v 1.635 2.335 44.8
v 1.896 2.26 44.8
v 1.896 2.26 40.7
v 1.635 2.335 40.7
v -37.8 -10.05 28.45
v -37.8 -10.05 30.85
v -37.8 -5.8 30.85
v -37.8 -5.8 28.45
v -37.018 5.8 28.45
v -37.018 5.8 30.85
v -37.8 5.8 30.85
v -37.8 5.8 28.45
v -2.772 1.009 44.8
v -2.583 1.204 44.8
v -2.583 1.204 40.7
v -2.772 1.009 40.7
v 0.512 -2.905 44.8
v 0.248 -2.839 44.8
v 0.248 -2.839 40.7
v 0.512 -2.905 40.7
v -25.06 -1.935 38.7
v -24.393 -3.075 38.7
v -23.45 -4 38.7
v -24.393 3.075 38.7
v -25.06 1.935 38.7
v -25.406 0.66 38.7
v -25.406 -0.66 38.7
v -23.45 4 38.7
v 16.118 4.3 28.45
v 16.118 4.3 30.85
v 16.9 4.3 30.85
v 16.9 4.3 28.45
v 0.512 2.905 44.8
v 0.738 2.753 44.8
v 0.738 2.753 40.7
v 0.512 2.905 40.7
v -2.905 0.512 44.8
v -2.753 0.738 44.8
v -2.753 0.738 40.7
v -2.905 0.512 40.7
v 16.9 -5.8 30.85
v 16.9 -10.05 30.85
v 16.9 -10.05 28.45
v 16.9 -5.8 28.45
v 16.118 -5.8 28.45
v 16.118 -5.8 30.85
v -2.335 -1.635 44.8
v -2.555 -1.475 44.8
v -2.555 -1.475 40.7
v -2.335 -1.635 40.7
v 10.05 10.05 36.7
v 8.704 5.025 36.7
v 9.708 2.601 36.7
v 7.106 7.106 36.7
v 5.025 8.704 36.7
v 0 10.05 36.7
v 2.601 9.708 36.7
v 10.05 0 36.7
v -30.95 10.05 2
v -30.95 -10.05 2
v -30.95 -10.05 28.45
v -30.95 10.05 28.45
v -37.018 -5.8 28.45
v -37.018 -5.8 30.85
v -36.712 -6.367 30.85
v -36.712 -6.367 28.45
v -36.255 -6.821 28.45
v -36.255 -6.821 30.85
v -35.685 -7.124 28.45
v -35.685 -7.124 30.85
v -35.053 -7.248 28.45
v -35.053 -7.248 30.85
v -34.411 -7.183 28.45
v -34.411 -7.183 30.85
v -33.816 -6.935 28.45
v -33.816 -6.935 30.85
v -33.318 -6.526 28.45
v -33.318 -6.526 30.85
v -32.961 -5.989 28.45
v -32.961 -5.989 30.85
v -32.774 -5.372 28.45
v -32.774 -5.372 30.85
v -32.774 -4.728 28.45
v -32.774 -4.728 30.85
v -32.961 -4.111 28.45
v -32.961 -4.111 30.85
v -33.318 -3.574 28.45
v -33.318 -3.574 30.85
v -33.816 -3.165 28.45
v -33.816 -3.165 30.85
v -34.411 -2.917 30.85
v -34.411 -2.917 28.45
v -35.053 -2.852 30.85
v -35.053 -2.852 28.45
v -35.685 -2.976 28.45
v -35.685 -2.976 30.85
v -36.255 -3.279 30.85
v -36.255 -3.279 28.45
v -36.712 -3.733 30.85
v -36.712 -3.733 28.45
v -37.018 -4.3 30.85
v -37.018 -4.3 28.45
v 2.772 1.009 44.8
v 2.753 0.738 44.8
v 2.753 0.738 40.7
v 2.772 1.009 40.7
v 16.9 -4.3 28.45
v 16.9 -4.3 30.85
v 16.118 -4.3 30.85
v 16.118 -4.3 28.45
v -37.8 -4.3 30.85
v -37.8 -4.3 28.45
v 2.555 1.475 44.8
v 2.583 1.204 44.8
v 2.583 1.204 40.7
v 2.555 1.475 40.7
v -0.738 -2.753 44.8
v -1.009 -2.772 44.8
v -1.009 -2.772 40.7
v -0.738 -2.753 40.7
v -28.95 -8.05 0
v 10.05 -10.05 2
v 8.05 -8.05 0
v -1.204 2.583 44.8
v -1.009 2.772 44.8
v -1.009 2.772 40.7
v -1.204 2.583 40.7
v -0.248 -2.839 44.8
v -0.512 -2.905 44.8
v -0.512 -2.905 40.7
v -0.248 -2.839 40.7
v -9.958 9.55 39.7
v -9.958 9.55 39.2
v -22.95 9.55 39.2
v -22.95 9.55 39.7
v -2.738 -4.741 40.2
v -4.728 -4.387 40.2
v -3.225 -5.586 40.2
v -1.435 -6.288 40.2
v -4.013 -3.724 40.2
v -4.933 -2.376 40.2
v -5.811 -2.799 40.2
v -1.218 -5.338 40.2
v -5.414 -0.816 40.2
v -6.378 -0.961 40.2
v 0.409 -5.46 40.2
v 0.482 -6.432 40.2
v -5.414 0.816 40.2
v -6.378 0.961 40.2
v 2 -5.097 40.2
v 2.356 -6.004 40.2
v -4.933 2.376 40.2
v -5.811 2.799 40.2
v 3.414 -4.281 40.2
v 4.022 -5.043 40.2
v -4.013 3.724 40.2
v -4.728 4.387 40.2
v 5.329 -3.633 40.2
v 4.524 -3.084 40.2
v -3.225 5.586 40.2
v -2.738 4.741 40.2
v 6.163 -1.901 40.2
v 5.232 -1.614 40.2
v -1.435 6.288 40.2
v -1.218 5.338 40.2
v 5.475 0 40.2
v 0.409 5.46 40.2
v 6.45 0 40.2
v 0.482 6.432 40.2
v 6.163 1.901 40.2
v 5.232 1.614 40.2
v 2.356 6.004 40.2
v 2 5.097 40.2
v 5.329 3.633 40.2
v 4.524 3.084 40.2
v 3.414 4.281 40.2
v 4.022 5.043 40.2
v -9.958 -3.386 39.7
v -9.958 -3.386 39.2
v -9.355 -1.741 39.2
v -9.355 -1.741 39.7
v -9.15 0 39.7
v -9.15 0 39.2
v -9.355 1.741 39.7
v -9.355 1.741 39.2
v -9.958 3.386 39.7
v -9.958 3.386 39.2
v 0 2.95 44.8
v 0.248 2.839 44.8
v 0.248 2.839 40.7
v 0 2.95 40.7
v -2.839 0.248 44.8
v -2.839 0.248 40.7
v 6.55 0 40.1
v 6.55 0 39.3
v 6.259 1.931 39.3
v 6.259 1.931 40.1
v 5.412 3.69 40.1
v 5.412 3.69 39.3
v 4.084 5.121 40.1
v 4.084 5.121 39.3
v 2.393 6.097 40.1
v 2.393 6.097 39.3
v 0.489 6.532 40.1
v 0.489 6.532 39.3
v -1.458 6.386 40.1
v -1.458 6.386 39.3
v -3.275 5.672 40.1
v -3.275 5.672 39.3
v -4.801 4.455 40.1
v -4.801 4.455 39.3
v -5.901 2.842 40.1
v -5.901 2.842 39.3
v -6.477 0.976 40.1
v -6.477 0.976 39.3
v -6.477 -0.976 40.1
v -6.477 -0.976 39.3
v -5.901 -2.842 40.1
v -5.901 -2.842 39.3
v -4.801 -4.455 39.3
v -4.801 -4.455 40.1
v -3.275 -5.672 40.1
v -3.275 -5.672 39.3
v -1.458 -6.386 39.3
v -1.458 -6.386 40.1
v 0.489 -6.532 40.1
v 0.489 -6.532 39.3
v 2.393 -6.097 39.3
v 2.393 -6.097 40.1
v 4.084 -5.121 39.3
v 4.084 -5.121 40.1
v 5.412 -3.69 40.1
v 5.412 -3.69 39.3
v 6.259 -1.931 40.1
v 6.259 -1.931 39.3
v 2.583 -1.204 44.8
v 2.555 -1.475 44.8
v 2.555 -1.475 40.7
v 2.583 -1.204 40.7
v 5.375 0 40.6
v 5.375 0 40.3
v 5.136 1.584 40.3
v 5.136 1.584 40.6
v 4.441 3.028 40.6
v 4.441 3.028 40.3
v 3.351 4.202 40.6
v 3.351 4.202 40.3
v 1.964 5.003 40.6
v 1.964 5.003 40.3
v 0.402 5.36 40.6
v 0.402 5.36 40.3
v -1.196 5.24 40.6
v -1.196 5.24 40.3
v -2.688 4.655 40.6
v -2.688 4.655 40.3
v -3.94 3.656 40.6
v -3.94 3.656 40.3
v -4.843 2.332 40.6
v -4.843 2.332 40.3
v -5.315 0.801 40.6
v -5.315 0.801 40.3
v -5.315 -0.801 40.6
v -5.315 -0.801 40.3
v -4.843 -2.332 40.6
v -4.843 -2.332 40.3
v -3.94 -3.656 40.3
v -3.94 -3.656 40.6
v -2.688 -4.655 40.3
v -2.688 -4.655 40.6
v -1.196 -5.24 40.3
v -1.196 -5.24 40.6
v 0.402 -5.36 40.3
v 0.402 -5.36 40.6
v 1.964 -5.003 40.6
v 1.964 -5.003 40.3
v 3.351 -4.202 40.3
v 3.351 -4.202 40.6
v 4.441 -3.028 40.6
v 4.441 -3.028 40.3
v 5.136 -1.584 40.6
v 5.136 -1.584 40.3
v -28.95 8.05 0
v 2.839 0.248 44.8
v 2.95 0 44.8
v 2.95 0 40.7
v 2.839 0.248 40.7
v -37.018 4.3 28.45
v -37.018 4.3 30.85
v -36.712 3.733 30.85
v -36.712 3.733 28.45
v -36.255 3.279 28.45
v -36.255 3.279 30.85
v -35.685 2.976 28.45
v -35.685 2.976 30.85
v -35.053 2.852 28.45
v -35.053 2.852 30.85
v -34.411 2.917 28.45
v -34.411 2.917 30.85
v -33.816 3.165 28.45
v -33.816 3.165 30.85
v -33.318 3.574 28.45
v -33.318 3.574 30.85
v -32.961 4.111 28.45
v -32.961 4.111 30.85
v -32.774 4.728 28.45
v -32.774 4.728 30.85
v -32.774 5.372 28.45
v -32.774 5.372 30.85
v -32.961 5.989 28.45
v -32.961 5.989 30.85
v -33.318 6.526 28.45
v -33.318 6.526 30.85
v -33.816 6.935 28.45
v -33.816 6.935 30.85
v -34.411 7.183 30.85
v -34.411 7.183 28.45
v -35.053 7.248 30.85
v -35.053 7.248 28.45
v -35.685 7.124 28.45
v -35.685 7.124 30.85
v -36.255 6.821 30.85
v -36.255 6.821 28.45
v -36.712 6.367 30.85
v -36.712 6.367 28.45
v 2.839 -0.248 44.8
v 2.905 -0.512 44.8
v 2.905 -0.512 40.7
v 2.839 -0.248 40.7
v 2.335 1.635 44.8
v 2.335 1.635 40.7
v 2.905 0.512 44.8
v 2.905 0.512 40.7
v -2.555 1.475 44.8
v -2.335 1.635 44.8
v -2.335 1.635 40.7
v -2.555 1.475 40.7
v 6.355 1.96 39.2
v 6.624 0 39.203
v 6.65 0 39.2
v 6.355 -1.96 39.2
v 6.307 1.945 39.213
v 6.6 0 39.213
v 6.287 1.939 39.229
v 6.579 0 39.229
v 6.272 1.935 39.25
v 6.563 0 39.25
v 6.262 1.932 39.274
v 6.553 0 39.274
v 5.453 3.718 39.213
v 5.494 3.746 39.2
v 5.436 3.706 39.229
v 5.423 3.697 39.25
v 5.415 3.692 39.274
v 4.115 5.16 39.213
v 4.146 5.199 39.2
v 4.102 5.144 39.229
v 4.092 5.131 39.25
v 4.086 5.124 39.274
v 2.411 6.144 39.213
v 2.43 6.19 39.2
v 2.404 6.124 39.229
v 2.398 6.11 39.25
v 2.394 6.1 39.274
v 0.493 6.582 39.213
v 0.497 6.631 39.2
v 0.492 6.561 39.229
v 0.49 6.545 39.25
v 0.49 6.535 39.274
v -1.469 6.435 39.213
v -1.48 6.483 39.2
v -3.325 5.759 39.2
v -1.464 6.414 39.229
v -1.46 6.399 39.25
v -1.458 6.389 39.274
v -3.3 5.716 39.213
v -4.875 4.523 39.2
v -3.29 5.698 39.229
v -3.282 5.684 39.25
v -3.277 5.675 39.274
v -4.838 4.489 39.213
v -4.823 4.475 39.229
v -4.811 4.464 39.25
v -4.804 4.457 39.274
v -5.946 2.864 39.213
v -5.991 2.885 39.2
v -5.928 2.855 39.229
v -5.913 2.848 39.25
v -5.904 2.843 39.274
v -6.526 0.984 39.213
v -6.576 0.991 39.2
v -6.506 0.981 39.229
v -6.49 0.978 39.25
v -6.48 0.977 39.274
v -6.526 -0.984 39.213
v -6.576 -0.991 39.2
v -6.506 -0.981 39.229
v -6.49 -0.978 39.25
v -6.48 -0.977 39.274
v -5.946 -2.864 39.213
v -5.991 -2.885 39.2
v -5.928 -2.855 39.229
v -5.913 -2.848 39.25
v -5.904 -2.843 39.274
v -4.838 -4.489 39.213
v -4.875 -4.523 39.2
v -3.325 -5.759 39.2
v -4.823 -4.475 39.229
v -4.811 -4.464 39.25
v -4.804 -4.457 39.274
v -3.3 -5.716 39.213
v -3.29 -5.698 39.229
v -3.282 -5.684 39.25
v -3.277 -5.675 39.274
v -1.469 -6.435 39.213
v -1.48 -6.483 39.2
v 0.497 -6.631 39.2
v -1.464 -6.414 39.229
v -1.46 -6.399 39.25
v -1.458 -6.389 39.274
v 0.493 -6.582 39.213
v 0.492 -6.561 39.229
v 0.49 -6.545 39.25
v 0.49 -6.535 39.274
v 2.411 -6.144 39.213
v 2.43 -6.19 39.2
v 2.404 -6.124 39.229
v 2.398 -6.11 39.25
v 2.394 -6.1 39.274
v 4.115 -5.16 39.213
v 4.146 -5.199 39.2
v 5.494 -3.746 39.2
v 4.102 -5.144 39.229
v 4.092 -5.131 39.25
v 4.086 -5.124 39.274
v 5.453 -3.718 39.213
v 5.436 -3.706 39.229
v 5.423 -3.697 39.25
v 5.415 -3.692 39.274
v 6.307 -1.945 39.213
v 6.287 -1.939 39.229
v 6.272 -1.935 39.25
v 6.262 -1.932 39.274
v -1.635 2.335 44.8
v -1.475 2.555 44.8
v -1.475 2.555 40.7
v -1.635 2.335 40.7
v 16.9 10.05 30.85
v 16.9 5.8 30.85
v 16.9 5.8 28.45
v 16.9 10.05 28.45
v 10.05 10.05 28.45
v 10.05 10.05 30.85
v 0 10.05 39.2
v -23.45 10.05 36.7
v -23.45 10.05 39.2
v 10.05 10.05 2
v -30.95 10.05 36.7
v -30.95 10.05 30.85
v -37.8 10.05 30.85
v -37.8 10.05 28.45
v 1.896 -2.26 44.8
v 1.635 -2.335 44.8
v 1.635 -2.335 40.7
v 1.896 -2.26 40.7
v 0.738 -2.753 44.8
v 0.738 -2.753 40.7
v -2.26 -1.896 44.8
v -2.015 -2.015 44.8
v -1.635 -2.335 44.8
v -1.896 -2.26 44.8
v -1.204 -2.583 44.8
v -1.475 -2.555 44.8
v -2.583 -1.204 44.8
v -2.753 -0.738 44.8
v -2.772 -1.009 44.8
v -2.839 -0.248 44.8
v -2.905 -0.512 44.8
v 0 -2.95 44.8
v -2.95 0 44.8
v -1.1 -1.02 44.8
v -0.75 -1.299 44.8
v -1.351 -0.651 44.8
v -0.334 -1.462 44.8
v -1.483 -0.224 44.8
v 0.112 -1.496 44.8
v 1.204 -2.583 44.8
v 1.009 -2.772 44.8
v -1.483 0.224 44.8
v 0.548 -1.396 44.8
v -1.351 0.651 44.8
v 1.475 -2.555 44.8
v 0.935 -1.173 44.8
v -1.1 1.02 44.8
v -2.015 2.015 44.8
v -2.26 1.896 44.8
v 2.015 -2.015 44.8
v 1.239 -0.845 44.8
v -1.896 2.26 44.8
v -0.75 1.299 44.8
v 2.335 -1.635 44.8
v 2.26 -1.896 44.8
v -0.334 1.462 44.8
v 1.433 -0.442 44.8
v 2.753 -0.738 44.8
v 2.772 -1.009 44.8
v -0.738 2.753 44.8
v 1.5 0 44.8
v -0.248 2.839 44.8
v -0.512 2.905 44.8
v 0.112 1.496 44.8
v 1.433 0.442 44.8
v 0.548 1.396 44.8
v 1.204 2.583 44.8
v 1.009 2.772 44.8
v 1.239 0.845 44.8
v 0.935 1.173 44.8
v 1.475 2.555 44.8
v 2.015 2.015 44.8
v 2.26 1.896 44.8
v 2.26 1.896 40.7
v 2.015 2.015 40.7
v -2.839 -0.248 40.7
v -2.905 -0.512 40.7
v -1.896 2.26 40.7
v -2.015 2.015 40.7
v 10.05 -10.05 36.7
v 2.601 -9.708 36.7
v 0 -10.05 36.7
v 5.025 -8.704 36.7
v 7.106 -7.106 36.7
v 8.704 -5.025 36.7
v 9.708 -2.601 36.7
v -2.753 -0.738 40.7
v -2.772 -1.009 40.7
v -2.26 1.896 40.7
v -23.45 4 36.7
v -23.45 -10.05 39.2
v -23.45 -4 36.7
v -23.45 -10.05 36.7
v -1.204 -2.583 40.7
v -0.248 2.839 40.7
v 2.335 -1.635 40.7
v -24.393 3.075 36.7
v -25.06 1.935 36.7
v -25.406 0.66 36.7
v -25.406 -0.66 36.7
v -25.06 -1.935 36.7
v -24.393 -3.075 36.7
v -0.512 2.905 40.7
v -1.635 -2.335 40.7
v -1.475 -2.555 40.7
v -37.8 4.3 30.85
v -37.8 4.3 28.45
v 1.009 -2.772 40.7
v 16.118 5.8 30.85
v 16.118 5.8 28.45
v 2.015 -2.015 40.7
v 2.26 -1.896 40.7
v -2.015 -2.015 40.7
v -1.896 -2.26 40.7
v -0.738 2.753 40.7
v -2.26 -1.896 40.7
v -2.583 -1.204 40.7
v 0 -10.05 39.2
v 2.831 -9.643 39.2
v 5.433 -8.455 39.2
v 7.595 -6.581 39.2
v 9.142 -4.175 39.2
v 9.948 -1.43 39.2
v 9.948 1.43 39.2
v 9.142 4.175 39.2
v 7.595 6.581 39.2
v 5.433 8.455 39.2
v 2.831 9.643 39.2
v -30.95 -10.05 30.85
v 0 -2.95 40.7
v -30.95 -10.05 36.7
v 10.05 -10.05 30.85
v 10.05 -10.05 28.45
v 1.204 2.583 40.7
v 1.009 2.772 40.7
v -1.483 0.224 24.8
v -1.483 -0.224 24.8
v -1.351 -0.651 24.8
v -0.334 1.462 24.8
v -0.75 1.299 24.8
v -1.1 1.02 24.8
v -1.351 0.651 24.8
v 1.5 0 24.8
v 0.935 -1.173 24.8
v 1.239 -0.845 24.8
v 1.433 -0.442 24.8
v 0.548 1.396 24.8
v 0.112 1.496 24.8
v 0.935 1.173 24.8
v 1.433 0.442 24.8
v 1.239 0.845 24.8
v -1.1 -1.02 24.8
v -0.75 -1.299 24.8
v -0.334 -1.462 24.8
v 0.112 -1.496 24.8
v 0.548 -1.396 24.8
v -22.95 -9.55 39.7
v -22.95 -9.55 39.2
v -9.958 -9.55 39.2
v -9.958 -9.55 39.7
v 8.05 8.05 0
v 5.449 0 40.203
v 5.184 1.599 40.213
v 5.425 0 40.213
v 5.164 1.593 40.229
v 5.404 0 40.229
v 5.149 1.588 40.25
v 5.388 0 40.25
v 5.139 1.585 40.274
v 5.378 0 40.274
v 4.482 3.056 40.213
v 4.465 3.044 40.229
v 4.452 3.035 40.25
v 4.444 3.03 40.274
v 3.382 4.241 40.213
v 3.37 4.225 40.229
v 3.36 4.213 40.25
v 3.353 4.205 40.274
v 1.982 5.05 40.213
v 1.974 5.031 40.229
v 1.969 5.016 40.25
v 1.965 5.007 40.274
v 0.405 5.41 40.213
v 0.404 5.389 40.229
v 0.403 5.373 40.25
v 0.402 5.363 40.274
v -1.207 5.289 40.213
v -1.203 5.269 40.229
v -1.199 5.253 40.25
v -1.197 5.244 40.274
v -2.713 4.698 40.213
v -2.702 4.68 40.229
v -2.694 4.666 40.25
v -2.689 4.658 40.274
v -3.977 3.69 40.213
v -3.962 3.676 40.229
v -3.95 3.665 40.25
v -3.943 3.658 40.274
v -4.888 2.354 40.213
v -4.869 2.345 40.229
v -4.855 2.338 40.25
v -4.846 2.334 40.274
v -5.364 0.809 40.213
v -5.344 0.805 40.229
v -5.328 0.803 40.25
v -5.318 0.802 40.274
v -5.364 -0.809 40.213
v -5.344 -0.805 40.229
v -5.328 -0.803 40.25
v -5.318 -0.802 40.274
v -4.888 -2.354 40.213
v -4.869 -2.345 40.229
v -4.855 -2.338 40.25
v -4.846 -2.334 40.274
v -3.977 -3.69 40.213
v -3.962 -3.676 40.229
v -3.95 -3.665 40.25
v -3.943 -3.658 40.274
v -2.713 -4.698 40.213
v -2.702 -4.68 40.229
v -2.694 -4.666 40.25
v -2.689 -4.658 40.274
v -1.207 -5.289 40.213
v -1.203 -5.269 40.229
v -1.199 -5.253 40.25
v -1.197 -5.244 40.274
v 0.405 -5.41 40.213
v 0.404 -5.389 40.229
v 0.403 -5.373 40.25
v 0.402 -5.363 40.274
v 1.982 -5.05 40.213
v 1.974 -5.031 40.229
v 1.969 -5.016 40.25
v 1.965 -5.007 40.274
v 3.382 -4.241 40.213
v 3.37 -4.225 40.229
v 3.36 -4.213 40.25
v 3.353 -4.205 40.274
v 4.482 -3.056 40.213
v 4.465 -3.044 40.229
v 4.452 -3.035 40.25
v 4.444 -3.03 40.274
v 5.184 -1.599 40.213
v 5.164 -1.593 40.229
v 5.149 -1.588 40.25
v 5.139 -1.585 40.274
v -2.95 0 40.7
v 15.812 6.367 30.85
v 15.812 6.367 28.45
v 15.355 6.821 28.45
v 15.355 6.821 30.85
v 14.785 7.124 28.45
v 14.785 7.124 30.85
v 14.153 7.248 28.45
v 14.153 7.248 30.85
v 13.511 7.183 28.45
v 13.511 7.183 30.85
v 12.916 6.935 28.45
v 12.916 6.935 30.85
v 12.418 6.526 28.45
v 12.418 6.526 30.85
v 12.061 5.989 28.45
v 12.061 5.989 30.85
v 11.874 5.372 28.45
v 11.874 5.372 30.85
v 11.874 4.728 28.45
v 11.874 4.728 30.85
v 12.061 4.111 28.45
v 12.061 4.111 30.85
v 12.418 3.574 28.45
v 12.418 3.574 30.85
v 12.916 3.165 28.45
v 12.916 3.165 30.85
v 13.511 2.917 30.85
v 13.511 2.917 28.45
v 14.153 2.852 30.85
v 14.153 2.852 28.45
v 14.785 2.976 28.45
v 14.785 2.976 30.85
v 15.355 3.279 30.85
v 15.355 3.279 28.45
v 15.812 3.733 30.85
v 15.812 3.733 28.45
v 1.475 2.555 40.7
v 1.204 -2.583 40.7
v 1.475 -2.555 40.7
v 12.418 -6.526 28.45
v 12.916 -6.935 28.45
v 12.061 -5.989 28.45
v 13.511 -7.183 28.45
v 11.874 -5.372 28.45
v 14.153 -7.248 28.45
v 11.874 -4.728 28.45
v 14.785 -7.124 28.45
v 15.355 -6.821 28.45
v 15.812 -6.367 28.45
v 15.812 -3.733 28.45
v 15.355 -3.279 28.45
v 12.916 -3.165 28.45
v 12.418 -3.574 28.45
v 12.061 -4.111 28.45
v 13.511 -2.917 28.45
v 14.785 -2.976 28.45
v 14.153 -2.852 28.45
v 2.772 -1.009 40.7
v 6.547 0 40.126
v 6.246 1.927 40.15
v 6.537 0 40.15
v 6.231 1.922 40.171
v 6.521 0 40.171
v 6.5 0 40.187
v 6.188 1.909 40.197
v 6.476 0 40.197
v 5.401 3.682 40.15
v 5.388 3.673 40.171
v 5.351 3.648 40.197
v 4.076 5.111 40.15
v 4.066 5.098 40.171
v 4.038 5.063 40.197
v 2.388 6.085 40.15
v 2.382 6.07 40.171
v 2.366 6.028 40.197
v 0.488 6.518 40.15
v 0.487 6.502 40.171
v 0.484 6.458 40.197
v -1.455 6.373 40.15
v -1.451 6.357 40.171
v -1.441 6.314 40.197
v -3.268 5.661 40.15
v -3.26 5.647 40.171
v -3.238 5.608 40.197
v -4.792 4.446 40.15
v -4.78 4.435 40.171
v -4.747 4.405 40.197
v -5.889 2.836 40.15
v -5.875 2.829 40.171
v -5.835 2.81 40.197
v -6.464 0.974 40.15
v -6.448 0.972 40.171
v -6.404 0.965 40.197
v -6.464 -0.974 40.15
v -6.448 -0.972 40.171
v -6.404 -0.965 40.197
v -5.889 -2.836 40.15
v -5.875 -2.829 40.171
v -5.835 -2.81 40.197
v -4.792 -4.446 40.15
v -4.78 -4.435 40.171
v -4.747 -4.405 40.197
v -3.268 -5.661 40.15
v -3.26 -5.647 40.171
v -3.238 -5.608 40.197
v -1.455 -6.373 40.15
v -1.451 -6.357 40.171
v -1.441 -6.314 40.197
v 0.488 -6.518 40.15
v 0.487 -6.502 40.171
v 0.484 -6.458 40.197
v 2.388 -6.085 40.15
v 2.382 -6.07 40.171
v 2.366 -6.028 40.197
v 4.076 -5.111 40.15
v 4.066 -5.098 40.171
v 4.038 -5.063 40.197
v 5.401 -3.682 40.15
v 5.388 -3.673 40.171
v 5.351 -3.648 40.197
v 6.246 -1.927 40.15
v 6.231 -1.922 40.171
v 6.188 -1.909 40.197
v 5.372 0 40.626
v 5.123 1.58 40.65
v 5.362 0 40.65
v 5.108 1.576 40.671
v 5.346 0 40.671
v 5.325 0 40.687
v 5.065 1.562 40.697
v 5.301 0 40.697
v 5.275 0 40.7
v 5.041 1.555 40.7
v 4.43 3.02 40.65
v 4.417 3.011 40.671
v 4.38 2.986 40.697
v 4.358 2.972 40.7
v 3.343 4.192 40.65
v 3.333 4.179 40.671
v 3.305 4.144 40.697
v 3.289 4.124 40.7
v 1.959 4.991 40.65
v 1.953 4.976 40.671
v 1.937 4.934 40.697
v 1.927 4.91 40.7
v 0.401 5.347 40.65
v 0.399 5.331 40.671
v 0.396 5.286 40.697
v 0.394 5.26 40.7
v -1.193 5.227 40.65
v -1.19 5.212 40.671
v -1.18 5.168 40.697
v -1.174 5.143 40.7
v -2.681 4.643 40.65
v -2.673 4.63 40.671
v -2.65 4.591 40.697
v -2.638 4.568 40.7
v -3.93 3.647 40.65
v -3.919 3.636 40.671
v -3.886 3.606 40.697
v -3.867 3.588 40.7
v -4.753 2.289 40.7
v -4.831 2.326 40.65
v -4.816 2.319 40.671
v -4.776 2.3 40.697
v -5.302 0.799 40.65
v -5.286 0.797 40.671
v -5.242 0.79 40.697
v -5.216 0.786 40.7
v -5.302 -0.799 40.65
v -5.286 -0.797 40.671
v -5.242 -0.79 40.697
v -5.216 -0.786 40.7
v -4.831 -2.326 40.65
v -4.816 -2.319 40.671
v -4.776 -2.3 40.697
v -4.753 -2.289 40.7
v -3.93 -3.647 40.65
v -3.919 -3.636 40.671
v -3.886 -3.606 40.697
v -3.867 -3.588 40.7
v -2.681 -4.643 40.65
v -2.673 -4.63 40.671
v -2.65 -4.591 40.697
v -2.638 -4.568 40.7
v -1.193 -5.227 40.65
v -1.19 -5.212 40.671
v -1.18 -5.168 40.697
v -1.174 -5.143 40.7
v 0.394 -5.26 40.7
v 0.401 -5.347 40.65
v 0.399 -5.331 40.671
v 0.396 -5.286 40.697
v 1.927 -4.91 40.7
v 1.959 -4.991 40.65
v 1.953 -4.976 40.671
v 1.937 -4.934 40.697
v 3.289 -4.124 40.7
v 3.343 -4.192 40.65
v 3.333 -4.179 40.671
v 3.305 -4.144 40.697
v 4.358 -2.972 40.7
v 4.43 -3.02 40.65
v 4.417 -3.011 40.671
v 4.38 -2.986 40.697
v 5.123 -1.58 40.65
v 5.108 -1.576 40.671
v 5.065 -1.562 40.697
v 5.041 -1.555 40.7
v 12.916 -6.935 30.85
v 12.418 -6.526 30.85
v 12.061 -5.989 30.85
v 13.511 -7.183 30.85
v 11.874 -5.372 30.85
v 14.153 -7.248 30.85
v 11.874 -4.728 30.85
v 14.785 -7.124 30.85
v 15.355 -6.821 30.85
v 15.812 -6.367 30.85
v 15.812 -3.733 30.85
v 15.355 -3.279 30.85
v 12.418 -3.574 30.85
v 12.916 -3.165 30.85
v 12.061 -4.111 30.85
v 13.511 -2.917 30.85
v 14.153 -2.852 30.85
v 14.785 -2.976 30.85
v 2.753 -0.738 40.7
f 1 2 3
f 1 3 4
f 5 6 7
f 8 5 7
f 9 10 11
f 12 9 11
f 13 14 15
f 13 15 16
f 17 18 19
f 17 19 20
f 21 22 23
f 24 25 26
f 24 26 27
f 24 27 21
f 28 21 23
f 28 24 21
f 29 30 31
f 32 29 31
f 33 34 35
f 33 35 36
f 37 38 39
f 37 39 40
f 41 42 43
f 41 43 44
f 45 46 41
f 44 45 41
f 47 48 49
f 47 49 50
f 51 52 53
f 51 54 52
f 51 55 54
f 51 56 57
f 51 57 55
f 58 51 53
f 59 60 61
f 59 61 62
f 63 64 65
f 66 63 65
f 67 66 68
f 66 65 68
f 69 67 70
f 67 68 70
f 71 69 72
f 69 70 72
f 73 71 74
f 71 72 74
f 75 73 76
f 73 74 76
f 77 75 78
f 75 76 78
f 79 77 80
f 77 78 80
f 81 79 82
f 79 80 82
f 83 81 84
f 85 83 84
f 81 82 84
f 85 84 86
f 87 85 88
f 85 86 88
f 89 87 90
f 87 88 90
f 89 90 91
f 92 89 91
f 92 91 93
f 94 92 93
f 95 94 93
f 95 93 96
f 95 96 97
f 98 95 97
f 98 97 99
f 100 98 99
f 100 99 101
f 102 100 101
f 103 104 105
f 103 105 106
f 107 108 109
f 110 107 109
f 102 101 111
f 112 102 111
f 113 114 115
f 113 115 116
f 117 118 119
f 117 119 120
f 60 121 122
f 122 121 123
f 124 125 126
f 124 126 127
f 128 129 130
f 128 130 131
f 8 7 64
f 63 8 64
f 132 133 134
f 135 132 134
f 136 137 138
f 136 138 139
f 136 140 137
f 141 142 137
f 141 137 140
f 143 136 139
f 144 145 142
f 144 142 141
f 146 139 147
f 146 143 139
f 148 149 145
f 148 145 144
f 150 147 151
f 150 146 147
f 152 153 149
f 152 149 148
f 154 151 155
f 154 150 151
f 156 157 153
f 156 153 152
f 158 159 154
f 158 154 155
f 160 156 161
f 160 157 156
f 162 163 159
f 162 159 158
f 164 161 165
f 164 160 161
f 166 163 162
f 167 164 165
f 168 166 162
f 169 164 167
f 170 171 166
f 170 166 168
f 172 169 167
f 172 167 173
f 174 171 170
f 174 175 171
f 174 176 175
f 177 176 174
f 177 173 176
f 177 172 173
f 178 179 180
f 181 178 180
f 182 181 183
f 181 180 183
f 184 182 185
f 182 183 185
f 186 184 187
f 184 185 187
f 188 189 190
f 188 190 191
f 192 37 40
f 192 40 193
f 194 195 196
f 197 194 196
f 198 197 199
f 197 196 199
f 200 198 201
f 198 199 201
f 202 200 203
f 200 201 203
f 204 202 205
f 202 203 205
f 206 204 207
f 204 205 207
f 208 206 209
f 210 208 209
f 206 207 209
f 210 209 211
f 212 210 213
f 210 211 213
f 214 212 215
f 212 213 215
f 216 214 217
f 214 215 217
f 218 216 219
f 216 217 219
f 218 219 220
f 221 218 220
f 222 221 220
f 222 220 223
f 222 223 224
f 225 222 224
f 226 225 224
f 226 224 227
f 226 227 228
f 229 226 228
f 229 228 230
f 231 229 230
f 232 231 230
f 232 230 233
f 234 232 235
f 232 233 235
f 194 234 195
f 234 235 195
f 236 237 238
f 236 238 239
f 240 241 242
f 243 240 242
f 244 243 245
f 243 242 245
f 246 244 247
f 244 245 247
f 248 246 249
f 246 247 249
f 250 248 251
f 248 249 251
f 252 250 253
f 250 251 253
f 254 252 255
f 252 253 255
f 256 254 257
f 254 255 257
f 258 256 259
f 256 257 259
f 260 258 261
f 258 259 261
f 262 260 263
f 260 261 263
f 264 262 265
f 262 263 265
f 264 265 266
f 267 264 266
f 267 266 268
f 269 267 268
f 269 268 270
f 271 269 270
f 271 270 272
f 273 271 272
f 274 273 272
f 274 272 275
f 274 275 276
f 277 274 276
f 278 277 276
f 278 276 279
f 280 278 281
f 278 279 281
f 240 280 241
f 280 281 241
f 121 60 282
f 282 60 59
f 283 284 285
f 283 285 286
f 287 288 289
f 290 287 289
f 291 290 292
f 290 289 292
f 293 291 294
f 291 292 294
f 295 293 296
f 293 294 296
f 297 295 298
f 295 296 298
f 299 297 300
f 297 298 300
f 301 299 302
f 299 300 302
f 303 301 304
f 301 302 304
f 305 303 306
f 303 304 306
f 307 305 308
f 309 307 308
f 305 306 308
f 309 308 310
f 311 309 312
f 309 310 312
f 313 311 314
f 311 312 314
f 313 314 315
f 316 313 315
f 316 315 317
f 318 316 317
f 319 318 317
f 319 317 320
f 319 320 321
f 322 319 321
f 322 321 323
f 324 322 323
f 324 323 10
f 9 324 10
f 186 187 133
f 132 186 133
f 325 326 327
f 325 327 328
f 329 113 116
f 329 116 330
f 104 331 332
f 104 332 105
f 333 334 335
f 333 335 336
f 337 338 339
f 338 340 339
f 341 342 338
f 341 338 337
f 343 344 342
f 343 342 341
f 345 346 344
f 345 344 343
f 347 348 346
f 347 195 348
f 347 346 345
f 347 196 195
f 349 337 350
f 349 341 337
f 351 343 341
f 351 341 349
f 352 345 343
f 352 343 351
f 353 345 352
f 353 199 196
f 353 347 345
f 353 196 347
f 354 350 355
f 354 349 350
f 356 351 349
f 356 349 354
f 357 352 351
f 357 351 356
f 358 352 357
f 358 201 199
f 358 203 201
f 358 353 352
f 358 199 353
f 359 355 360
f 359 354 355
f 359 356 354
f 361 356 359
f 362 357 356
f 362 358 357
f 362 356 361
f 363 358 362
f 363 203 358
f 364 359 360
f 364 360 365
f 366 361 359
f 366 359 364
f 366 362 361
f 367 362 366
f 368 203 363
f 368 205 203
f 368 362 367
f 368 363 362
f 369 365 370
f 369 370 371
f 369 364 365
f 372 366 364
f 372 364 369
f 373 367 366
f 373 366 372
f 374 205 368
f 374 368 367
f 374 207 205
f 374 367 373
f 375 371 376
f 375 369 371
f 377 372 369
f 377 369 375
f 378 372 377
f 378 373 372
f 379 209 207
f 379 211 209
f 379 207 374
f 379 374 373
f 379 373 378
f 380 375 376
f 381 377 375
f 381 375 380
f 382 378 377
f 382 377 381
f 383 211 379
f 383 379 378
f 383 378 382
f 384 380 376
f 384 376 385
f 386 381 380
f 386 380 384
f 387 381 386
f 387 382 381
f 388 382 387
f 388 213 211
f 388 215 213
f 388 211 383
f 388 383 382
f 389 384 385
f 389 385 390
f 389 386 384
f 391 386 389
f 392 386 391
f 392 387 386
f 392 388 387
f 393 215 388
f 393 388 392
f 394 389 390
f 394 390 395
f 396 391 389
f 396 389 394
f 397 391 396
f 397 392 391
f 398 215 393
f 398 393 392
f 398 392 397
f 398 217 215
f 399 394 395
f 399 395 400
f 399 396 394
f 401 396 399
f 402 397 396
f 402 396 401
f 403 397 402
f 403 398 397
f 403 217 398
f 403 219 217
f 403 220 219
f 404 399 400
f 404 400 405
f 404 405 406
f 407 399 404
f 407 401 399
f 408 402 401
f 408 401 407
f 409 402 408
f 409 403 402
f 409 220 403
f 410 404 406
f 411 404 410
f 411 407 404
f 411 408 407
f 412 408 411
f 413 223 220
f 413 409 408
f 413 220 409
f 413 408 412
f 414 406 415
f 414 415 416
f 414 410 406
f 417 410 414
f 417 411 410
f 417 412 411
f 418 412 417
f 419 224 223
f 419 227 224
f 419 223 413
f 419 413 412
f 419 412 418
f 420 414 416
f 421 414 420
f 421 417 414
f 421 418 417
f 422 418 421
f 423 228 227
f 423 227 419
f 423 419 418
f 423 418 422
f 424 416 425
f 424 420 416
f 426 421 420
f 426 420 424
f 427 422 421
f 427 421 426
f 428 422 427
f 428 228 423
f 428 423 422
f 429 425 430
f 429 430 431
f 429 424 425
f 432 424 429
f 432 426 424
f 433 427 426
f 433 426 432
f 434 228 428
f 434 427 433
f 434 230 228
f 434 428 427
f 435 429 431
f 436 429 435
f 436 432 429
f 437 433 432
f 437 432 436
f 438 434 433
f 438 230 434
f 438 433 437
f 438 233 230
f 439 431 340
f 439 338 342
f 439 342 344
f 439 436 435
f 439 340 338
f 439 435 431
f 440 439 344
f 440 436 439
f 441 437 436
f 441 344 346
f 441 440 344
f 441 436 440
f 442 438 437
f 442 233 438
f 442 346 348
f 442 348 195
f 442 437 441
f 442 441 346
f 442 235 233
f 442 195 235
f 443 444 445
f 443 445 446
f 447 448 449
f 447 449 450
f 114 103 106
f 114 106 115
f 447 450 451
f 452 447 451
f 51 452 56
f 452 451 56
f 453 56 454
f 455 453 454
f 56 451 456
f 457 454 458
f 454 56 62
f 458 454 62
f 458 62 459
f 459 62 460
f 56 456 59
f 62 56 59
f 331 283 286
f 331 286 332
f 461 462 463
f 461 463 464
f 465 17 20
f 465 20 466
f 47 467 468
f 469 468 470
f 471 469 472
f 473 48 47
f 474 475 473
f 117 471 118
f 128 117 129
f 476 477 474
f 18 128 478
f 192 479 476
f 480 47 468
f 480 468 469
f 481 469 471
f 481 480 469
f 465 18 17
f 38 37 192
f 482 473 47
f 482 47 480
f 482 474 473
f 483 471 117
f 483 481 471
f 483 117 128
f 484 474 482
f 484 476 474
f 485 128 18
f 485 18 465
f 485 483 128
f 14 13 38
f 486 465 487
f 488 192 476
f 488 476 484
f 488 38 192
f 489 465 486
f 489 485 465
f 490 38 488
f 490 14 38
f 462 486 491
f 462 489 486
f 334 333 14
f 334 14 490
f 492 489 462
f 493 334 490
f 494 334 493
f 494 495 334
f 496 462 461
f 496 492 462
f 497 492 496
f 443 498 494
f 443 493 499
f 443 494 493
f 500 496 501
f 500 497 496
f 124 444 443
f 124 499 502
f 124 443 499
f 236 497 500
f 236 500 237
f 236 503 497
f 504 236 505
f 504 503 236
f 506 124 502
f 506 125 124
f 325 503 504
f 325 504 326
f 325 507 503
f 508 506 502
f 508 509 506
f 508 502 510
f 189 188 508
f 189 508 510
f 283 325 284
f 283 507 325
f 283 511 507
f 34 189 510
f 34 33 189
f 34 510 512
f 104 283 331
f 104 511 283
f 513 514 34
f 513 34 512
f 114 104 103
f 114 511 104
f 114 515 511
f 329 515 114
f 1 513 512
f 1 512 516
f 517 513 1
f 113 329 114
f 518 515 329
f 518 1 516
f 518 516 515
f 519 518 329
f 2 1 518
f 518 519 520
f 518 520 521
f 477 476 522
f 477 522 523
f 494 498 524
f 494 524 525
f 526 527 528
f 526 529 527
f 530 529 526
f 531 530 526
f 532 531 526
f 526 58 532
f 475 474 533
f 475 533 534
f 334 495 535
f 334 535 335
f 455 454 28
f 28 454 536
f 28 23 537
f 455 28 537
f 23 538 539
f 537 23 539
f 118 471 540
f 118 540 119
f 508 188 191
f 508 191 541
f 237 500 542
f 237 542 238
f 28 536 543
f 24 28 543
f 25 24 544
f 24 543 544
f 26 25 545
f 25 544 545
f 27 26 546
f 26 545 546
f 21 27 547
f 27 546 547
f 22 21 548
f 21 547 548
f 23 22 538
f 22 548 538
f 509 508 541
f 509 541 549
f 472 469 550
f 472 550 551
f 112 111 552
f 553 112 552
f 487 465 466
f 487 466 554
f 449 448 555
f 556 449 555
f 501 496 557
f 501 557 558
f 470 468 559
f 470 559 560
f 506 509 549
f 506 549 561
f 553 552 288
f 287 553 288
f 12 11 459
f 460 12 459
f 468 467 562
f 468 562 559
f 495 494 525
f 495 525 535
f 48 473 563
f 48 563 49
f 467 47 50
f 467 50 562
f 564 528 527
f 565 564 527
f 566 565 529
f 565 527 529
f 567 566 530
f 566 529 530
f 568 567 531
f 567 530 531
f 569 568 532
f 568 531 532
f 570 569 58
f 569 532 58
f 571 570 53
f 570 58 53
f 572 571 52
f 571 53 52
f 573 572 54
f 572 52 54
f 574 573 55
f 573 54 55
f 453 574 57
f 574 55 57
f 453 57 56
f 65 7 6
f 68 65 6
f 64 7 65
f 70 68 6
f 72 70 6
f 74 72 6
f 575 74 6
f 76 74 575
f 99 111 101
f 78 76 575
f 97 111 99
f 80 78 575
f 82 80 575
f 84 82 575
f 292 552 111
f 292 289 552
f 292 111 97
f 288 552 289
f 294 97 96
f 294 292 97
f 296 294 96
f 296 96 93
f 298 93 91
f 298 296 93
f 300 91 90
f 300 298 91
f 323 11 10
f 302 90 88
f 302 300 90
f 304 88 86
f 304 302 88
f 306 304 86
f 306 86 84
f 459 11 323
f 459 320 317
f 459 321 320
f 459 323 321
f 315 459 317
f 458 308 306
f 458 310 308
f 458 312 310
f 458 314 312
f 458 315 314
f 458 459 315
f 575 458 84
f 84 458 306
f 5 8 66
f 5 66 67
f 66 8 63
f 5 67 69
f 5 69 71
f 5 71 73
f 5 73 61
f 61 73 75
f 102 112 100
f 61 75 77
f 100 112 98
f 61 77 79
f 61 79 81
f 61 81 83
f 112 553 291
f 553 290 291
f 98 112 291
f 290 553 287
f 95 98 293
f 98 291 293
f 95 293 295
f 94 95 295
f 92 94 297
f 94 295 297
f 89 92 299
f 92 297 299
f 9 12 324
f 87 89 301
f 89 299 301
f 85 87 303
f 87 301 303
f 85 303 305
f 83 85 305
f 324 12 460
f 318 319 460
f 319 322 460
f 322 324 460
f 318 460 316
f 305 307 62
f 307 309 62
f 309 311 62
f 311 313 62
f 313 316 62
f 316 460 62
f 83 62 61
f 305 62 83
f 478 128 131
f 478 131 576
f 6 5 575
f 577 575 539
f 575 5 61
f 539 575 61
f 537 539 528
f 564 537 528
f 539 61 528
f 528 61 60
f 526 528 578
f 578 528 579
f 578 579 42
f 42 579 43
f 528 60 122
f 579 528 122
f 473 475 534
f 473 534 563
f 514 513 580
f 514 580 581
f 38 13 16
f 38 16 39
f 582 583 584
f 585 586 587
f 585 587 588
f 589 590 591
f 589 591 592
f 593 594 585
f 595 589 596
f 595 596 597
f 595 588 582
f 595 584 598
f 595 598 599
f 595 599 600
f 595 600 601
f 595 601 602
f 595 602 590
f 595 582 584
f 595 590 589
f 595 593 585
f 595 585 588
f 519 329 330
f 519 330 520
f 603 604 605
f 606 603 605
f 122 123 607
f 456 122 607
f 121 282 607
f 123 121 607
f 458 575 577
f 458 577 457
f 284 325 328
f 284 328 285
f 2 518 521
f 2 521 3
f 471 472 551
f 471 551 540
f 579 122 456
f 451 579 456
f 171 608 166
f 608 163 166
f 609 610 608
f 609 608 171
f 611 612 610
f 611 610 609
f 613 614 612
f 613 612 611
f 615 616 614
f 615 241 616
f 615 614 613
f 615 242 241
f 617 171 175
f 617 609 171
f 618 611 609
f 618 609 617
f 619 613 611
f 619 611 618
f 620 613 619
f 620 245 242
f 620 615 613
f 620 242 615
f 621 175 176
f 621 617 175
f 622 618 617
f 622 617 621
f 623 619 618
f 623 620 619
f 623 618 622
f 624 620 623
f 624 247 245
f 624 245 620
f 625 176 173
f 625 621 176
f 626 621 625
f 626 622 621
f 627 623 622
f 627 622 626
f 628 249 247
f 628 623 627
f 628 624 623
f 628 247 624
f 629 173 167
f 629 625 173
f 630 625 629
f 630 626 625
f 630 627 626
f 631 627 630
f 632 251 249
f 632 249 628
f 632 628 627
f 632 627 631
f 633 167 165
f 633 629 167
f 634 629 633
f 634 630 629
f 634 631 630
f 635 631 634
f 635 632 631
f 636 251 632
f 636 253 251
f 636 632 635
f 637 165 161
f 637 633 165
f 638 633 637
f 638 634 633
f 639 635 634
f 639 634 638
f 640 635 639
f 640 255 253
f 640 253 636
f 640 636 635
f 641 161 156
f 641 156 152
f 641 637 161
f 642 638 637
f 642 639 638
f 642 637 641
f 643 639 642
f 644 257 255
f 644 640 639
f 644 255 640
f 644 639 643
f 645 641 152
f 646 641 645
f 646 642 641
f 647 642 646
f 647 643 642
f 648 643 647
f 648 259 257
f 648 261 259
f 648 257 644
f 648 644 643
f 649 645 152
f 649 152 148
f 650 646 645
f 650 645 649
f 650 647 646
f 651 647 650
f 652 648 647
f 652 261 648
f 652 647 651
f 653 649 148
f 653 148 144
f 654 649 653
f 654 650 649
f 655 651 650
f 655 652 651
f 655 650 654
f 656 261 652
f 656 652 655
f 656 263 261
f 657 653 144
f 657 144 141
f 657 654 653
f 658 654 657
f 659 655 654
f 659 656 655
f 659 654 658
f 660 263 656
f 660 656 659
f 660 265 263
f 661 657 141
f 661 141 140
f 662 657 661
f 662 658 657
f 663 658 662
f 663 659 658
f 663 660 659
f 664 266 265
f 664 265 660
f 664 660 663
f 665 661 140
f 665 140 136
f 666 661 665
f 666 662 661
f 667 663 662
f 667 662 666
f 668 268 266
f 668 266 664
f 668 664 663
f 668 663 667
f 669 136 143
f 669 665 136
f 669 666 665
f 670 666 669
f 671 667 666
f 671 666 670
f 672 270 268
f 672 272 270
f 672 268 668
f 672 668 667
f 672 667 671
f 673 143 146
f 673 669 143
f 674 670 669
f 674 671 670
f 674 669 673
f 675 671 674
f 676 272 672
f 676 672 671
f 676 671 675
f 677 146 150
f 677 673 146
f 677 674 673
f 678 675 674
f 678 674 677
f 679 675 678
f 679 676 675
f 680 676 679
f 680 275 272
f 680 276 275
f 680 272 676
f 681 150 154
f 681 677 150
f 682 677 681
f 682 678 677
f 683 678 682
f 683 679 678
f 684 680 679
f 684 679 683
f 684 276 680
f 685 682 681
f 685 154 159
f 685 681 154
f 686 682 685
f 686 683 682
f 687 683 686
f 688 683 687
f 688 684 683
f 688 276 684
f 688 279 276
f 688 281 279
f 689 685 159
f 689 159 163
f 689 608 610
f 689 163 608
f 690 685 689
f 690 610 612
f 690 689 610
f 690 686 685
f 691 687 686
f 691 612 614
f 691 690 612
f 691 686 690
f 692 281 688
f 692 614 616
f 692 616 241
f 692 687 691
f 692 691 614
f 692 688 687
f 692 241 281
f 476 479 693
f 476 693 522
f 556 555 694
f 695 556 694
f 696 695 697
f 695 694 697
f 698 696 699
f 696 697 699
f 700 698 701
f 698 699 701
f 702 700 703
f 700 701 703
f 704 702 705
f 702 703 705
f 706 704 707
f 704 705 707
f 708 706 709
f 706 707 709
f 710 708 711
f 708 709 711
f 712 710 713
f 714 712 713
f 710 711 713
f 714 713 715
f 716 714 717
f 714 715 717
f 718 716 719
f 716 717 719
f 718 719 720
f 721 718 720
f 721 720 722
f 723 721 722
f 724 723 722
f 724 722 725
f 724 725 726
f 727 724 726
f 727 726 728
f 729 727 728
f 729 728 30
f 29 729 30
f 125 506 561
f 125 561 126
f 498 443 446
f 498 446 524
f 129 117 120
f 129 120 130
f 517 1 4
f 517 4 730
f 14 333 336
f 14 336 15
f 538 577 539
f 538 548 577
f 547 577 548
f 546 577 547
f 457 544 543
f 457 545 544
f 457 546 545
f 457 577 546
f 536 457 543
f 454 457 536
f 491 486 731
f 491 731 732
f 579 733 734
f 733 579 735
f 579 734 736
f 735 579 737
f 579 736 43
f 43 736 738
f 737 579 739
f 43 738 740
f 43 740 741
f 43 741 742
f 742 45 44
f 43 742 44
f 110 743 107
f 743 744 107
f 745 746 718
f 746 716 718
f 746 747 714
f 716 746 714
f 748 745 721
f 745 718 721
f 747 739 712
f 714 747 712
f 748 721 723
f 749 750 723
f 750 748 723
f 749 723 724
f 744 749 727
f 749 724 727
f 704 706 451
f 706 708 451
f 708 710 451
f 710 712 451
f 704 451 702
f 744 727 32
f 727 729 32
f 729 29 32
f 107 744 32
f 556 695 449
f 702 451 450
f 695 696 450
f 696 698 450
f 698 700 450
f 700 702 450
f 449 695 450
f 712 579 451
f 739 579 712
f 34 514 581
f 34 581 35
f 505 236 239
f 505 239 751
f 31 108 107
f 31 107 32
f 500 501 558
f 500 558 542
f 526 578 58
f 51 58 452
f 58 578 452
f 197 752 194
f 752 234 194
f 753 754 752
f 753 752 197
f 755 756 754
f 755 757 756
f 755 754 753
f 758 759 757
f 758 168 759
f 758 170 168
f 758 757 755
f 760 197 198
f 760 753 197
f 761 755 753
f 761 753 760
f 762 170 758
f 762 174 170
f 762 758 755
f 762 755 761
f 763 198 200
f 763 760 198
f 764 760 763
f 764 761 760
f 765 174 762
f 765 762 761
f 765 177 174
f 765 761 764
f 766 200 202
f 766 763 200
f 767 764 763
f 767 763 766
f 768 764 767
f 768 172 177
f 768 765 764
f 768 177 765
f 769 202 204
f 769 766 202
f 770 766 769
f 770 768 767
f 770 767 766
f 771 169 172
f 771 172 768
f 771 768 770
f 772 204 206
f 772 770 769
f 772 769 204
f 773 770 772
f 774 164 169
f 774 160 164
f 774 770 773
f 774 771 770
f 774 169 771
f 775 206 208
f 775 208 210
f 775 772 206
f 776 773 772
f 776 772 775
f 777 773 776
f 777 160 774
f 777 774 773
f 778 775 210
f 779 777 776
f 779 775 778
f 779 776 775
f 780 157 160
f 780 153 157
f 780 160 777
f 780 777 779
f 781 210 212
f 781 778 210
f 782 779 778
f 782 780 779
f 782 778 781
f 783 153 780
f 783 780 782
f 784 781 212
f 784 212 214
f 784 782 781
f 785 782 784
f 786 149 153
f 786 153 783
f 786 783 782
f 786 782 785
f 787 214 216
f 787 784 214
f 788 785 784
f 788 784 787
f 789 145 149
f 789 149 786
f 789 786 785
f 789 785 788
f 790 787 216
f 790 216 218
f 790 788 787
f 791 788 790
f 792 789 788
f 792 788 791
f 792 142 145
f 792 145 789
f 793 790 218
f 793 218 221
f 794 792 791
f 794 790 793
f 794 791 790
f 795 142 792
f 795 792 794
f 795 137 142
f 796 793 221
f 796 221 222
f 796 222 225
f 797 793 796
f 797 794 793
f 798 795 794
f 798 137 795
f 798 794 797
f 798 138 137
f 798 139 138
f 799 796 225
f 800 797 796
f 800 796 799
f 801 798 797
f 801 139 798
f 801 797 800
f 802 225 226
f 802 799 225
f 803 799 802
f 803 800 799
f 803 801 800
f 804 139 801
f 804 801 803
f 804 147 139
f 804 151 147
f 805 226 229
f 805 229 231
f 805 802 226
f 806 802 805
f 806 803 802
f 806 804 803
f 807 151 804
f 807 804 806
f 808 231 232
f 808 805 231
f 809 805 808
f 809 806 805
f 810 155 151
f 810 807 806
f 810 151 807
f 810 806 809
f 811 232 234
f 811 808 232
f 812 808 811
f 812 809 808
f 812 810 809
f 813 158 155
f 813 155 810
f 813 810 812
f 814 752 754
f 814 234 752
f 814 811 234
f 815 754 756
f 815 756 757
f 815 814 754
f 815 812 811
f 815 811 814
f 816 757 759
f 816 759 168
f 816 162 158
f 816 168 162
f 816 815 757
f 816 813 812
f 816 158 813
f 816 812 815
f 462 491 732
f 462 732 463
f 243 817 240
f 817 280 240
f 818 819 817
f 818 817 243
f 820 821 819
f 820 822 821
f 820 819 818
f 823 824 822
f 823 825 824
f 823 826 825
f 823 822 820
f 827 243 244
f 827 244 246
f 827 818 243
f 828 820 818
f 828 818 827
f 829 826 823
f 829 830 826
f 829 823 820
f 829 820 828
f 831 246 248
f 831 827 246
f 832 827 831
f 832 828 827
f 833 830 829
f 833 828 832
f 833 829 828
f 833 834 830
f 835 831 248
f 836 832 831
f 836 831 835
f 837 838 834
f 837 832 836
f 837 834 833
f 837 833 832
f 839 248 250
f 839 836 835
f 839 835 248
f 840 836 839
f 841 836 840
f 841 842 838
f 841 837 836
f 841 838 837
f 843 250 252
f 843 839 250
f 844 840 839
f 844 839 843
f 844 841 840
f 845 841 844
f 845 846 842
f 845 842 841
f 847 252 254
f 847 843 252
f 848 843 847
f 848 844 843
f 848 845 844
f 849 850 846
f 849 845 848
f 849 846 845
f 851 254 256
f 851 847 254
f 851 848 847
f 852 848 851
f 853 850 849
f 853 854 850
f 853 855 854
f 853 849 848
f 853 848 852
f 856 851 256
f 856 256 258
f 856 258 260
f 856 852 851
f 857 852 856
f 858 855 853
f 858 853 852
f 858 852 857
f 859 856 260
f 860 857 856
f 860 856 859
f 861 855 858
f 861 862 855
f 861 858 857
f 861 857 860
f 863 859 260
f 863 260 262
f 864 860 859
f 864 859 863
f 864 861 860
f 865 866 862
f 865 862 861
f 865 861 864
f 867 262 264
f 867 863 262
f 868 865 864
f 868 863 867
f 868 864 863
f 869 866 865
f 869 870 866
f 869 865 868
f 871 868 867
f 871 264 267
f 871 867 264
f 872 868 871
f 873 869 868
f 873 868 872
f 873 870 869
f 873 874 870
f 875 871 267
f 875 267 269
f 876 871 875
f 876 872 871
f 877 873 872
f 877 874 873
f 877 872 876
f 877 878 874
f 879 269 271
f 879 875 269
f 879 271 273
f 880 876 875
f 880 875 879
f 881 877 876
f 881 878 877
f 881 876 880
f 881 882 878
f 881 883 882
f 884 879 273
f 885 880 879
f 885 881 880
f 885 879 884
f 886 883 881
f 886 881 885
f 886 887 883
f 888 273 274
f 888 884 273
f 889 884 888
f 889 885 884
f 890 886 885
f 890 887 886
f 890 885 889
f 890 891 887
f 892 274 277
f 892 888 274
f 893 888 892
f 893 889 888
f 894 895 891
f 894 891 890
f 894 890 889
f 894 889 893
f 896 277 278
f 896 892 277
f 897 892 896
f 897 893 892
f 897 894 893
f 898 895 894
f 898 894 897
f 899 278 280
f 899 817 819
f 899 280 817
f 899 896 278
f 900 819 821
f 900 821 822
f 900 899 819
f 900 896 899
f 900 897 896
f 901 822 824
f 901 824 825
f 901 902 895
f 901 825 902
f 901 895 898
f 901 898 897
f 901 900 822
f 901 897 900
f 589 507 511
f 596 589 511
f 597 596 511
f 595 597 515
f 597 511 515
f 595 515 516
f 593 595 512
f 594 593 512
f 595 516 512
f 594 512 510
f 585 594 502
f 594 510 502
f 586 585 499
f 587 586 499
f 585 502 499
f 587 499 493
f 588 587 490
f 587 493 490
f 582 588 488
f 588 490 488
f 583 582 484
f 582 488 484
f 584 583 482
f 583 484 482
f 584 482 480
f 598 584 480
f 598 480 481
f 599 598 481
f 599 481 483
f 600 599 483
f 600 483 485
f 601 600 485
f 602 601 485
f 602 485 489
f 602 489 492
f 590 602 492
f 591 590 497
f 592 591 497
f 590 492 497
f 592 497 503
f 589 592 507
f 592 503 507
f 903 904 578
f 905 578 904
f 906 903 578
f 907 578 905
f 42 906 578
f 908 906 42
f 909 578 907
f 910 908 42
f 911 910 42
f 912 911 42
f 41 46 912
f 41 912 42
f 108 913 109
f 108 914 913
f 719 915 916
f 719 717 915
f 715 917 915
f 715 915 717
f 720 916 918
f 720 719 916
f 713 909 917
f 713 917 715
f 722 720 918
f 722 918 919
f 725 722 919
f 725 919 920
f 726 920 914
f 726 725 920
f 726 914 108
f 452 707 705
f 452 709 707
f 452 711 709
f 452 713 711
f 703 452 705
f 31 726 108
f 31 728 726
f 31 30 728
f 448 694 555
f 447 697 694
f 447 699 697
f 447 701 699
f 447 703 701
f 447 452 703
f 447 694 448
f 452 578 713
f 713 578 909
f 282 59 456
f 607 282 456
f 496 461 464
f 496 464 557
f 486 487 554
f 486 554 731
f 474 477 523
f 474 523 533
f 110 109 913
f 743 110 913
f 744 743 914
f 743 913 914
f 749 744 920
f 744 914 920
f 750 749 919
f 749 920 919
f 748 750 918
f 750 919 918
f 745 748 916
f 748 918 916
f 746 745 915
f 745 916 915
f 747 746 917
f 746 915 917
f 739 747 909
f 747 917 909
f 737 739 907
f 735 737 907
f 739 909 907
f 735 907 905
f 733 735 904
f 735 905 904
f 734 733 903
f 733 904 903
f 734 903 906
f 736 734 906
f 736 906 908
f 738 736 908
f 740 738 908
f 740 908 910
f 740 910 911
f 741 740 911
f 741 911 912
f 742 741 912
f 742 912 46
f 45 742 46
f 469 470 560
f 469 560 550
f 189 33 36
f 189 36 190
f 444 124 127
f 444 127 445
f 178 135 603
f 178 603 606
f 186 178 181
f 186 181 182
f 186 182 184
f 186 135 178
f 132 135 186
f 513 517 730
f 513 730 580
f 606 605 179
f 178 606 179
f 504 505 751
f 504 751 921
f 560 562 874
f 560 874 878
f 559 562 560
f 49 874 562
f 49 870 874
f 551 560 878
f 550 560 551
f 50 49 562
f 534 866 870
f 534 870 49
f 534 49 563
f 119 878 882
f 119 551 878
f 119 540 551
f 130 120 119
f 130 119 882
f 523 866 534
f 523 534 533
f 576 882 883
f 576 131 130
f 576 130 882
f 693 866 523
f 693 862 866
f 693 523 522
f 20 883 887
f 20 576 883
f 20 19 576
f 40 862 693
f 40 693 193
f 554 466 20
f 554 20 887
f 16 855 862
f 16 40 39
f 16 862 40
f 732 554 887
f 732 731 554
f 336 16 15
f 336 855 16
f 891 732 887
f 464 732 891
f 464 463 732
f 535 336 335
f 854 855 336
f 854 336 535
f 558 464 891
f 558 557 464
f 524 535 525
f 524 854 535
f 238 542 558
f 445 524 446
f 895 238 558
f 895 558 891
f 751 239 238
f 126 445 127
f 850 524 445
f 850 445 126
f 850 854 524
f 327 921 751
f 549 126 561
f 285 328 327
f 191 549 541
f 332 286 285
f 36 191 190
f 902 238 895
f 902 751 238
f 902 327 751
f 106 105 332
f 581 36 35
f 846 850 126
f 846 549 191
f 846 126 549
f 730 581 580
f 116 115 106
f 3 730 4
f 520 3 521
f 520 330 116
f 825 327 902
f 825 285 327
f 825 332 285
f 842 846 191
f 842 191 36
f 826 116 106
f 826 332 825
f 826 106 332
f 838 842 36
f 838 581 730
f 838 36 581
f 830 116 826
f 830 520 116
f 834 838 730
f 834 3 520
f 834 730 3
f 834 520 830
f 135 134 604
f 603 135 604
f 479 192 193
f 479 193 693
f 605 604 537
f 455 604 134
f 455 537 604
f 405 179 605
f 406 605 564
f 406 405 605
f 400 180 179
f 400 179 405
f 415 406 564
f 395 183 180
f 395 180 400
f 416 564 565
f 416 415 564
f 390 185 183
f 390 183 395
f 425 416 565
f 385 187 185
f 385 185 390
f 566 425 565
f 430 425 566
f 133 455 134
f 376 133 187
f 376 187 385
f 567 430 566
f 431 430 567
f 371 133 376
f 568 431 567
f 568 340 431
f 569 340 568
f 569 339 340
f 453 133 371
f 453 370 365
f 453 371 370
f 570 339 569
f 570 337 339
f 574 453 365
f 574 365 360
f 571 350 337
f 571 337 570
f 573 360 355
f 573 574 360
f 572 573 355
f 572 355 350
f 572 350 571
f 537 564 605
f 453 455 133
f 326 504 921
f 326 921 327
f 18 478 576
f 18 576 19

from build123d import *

# Parameters (mm, degrees)
F0_W      = 41
F0_H      = 20.1
F1_DEPTH  = 36.7
F3_DEPTH  = 2.5
F5_DEPTH  = 0.5
F6_R      = 6.55
F7_DEPTH  = 1
F8_R      = 5.375
F9_DEPTH  = 0.5
F12_DEPTH = 4.1
F13_SIZE  = 2
F15_W     = 6.85
F15_H     = 20.1
F16_DEPTH = 2.4
F18_DEPTH = 25
F19_R     = 0.1
F20_R     = 1.5
F21_DEPTH = 20
F23_DEPTH = 0.5


with BuildPart() as f1:
    # F0 (on Top) → F1 (new body)
    with BuildSketch(Plane.XY):
        with Locations((-10.45, 0)):
            Rectangle(F0_W, F0_H)
    extrude(amount=F1_DEPTH)

    # F2 (on face) → F3 (join)
    with BuildSketch(Plane.XY.offset(36.7)):
        with BuildLine():
            Line((-23.45, -10.05), (0, -10.05))
            ThreePointArc((0, -10.05), (10.05, 0), (0, 10.05))
            Line((0, 10.05), (-23.45, 10.05))
            Line((-23.45, 10.05), (-23.45, 4))
            ThreePointArc((-23.45, 4), (-25.45, 0), (-23.45, -4))
            Line((-23.45, -4), (-23.45, -10.05))
        make_face()
    extrude(amount=F3_DEPTH)

    # F4 (on face) → F5 (cut)
    with BuildSketch(Plane.XY.offset(39.2)):
        with BuildLine():
            Line((-23.45, -4), (-23.45, 4))
            ThreePointArc((-23.45, 4), (-25.45, 0), (-23.45, -4))
        make_face()
    extrude(amount=-F5_DEPTH, mode=Mode.SUBTRACT)

    # F6 (on face) → F7 (join)
    with BuildSketch(Plane.XY.offset(39.2)):
        Circle(F6_R)
    extrude(amount=F7_DEPTH)

    # F8 (on face) → F9 (join)
    with BuildSketch(Plane.XY.offset(40.2)):
        Circle(F8_R)
    extrude(amount=F9_DEPTH)

    # F11 (on face) → F12 (join)
    with BuildSketch(Plane.XY.offset(40.7)):
        Polygon((-0.2483938668, -2.8391548896), (0, -2.95), (0.2483938668, -2.8391548896), (0.5122621241, -2.9051828714), (0.7376342785, -2.7528886049), (1.0089594228, -2.7720932313), (1.204462046, -2.5829771931), (1.475, -2.5547749412), (1.6346928436, -2.3345833262), (1.8962234486, -2.2598311072), (2.0152543264, -2.0152543264), (2.2598311072, -1.8962234486), (2.3345833262, -1.6346928436), (2.5547749412, -1.475), (2.5829771931, -1.204462046), (2.7720932313, -1.0089594228), (2.7528886049, -0.7376342785), (2.9051828714, -0.5122621241), (2.8391548896, -0.2483938668), (2.95, 0), (2.8391548896, 0.2483938668), (2.9051828714, 0.5122621241), (2.7528886049, 0.7376342785), (2.7720932313, 1.0089594228), (2.5829771931, 1.204462046), (2.5547749412, 1.475), (2.3345833262, 1.6346928436), (2.2598311072, 1.8962234486), (2.0152543264, 2.0152543264), (1.8962234486, 2.2598311072), (1.6346928436, 2.3345833262), (1.475, 2.5547749412), (1.204462046, 2.5829771931), (1.0089594228, 2.7720932313), (0.7376342785, 2.7528886049), (0.5122621241, 2.9051828714), (0.2483938668, 2.8391548896), (0, 2.95), (-0.2483938668, 2.8391548896), (-0.5122621241, 2.9051828714), (-0.7376342785, 2.7528886049), (-1.0089594228, 2.7720932313), (-1.204462046, 2.5829771931), (-1.475, 2.5547749412), (-1.6346928436, 2.3345833262), (-1.8962234486, 2.2598311072), (-2.0152543264, 2.0152543264), (-2.2598311072, 1.8962234486), (-2.3345833262, 1.6346928436), (-2.5547749412, 1.475), (-2.5829771931, 1.204462046), (-2.7720932313, 1.0089594228), (-2.7528886049, 0.7376342785), (-2.9051828714, 0.5122621241), (-2.8391548896, 0.2483938668), (-2.95, 0), (-2.8391548896, -0.2483938668), (-2.9051828714, -0.5122621241), (-2.7528886049, -0.7376342785), (-2.7720932313, -1.0089594228), (-2.5829771931, -1.204462046), (-2.5547749412, -1.475), (-2.3345833262, -1.6346928436), (-2.2598311072, -1.8962234486), (-2.0152543264, -2.0152543264), (-1.8962234486, -2.2598311072), (-1.6346928436, -2.3345833262), (-1.475, -2.5547749412), (-1.204462046, -2.5829771931), (-1.0089594228, -2.7720932313), (-0.7376342785, -2.7528886049), (-0.5122621241, -2.9051828714), align=None)
    extrude(amount=F12_DEPTH)

    # F13
    f13_edges = [f1.edges().sort_by_distance(p)[0] for p in [
        (-10.45, 10.05, 0),
        (10.05, 0, 0),
        (-10.45, -10.05, 0),
        (-30.95, 0, 0),
    ]]
    chamfer(f13_edges, length=F13_SIZE)

    # F15 (on offset) → F16 (join)
    with BuildSketch(Plane.XY.offset(30.85)):
        Polygon((10.05, 10.05), (10.05, 0), (10.05, -10.05), (16.9, -10.05), (16.9, 10.05), align=None)
        with Locations((-34.375, 0)):
            Rectangle(F15_W, F15_H)
    extrude(amount=-F16_DEPTH)

    # F17 (on face) → F18 (cut)
    with BuildSketch(Plane.XY.offset(30.85)):
        with BuildLine():
            Line((-38.7193858624, 4.3), (-37.018211788, 4.3))
            ThreePointArc((-37.018211788, 4.3), (-32.75, 5.05), (-37.018211788, 5.8))
            Line((-37.018211788, 5.8), (-38.7193858624, 5.8))
            Line((-38.7193858624, 5.8), (-38.7193858624, 4.3))
        make_face()
        with BuildLine():
            Line((20.3046184033, 5.8), (16.118211788, 5.8))
            ThreePointArc((16.118211788, 5.8), (11.85, 5.05), (16.118211788, 4.3))
            Line((16.118211788, 4.3), (20.3046184033, 4.3))
            Line((20.3046184033, 4.3), (20.3046184033, 5.8))
        make_face()
        with BuildLine():
            Line((-38.7193858624, -4.3), (-38.7193858624, -5.8))
            Line((-38.7193858624, -5.8), (-37.018211788, -5.8))
            ThreePointArc((-37.018211788, -5.8), (-32.75, -5.05), (-37.018211788, -4.3))
            Line((-37.018211788, -4.3), (-38.7193858624, -4.3))
        make_face()
        with BuildLine():
            Line((16.118211788, -5.8), (20.3046184033, -5.8))
            Line((20.3046184033, -5.8), (20.3046184033, -4.3))
            Line((20.3046184033, -4.3), (16.118211788, -4.3))
            ThreePointArc((16.118211788, -4.3), (11.85, -5.05), (16.118211788, -5.8))
        make_face()
    extrude(amount=-F18_DEPTH, mode=Mode.SUBTRACT)

    # F19
    f19_edges = [f1.edges().sort_by_distance(p)[0] for p in [
        (-6.55, 0, 39.2),
        (-6.55, 0, 40.2),
        (-5.375, 0, 40.2),
        (-5.375, 0, 40.7),
    ]]
    fillet(f19_edges, radius=F19_R)

    # F20 (on face) → F21 (cut)
    with BuildSketch(Plane.XY.offset(44.8)):
        Circle(F20_R)
    extrude(amount=-F21_DEPTH, mode=Mode.SUBTRACT)

    # F22 (on face) → F23 (join)
    with BuildSketch(Plane.XY.offset(39.2)):
        with BuildLine():
            Line((-9.9580191225, 9.55), (-22.95, 9.55))
            Line((-22.95, 9.55), (-22.95, -9.55))
            Line((-22.95, -9.55), (-9.9580191225, -9.55))
            Line((-9.9580191225, -9.55), (-9.9580191225, -3.3863537817))
            ThreePointArc((-9.9580191225, -3.3863537817), (-9.15, 0), (-9.9580191225, 3.3863537817))
            Line((-9.9580191225, 3.3863537817), (-9.9580191225, 9.55))
        make_face()
    extrude(amount=F23_DEPTH)


solid = f1.part
